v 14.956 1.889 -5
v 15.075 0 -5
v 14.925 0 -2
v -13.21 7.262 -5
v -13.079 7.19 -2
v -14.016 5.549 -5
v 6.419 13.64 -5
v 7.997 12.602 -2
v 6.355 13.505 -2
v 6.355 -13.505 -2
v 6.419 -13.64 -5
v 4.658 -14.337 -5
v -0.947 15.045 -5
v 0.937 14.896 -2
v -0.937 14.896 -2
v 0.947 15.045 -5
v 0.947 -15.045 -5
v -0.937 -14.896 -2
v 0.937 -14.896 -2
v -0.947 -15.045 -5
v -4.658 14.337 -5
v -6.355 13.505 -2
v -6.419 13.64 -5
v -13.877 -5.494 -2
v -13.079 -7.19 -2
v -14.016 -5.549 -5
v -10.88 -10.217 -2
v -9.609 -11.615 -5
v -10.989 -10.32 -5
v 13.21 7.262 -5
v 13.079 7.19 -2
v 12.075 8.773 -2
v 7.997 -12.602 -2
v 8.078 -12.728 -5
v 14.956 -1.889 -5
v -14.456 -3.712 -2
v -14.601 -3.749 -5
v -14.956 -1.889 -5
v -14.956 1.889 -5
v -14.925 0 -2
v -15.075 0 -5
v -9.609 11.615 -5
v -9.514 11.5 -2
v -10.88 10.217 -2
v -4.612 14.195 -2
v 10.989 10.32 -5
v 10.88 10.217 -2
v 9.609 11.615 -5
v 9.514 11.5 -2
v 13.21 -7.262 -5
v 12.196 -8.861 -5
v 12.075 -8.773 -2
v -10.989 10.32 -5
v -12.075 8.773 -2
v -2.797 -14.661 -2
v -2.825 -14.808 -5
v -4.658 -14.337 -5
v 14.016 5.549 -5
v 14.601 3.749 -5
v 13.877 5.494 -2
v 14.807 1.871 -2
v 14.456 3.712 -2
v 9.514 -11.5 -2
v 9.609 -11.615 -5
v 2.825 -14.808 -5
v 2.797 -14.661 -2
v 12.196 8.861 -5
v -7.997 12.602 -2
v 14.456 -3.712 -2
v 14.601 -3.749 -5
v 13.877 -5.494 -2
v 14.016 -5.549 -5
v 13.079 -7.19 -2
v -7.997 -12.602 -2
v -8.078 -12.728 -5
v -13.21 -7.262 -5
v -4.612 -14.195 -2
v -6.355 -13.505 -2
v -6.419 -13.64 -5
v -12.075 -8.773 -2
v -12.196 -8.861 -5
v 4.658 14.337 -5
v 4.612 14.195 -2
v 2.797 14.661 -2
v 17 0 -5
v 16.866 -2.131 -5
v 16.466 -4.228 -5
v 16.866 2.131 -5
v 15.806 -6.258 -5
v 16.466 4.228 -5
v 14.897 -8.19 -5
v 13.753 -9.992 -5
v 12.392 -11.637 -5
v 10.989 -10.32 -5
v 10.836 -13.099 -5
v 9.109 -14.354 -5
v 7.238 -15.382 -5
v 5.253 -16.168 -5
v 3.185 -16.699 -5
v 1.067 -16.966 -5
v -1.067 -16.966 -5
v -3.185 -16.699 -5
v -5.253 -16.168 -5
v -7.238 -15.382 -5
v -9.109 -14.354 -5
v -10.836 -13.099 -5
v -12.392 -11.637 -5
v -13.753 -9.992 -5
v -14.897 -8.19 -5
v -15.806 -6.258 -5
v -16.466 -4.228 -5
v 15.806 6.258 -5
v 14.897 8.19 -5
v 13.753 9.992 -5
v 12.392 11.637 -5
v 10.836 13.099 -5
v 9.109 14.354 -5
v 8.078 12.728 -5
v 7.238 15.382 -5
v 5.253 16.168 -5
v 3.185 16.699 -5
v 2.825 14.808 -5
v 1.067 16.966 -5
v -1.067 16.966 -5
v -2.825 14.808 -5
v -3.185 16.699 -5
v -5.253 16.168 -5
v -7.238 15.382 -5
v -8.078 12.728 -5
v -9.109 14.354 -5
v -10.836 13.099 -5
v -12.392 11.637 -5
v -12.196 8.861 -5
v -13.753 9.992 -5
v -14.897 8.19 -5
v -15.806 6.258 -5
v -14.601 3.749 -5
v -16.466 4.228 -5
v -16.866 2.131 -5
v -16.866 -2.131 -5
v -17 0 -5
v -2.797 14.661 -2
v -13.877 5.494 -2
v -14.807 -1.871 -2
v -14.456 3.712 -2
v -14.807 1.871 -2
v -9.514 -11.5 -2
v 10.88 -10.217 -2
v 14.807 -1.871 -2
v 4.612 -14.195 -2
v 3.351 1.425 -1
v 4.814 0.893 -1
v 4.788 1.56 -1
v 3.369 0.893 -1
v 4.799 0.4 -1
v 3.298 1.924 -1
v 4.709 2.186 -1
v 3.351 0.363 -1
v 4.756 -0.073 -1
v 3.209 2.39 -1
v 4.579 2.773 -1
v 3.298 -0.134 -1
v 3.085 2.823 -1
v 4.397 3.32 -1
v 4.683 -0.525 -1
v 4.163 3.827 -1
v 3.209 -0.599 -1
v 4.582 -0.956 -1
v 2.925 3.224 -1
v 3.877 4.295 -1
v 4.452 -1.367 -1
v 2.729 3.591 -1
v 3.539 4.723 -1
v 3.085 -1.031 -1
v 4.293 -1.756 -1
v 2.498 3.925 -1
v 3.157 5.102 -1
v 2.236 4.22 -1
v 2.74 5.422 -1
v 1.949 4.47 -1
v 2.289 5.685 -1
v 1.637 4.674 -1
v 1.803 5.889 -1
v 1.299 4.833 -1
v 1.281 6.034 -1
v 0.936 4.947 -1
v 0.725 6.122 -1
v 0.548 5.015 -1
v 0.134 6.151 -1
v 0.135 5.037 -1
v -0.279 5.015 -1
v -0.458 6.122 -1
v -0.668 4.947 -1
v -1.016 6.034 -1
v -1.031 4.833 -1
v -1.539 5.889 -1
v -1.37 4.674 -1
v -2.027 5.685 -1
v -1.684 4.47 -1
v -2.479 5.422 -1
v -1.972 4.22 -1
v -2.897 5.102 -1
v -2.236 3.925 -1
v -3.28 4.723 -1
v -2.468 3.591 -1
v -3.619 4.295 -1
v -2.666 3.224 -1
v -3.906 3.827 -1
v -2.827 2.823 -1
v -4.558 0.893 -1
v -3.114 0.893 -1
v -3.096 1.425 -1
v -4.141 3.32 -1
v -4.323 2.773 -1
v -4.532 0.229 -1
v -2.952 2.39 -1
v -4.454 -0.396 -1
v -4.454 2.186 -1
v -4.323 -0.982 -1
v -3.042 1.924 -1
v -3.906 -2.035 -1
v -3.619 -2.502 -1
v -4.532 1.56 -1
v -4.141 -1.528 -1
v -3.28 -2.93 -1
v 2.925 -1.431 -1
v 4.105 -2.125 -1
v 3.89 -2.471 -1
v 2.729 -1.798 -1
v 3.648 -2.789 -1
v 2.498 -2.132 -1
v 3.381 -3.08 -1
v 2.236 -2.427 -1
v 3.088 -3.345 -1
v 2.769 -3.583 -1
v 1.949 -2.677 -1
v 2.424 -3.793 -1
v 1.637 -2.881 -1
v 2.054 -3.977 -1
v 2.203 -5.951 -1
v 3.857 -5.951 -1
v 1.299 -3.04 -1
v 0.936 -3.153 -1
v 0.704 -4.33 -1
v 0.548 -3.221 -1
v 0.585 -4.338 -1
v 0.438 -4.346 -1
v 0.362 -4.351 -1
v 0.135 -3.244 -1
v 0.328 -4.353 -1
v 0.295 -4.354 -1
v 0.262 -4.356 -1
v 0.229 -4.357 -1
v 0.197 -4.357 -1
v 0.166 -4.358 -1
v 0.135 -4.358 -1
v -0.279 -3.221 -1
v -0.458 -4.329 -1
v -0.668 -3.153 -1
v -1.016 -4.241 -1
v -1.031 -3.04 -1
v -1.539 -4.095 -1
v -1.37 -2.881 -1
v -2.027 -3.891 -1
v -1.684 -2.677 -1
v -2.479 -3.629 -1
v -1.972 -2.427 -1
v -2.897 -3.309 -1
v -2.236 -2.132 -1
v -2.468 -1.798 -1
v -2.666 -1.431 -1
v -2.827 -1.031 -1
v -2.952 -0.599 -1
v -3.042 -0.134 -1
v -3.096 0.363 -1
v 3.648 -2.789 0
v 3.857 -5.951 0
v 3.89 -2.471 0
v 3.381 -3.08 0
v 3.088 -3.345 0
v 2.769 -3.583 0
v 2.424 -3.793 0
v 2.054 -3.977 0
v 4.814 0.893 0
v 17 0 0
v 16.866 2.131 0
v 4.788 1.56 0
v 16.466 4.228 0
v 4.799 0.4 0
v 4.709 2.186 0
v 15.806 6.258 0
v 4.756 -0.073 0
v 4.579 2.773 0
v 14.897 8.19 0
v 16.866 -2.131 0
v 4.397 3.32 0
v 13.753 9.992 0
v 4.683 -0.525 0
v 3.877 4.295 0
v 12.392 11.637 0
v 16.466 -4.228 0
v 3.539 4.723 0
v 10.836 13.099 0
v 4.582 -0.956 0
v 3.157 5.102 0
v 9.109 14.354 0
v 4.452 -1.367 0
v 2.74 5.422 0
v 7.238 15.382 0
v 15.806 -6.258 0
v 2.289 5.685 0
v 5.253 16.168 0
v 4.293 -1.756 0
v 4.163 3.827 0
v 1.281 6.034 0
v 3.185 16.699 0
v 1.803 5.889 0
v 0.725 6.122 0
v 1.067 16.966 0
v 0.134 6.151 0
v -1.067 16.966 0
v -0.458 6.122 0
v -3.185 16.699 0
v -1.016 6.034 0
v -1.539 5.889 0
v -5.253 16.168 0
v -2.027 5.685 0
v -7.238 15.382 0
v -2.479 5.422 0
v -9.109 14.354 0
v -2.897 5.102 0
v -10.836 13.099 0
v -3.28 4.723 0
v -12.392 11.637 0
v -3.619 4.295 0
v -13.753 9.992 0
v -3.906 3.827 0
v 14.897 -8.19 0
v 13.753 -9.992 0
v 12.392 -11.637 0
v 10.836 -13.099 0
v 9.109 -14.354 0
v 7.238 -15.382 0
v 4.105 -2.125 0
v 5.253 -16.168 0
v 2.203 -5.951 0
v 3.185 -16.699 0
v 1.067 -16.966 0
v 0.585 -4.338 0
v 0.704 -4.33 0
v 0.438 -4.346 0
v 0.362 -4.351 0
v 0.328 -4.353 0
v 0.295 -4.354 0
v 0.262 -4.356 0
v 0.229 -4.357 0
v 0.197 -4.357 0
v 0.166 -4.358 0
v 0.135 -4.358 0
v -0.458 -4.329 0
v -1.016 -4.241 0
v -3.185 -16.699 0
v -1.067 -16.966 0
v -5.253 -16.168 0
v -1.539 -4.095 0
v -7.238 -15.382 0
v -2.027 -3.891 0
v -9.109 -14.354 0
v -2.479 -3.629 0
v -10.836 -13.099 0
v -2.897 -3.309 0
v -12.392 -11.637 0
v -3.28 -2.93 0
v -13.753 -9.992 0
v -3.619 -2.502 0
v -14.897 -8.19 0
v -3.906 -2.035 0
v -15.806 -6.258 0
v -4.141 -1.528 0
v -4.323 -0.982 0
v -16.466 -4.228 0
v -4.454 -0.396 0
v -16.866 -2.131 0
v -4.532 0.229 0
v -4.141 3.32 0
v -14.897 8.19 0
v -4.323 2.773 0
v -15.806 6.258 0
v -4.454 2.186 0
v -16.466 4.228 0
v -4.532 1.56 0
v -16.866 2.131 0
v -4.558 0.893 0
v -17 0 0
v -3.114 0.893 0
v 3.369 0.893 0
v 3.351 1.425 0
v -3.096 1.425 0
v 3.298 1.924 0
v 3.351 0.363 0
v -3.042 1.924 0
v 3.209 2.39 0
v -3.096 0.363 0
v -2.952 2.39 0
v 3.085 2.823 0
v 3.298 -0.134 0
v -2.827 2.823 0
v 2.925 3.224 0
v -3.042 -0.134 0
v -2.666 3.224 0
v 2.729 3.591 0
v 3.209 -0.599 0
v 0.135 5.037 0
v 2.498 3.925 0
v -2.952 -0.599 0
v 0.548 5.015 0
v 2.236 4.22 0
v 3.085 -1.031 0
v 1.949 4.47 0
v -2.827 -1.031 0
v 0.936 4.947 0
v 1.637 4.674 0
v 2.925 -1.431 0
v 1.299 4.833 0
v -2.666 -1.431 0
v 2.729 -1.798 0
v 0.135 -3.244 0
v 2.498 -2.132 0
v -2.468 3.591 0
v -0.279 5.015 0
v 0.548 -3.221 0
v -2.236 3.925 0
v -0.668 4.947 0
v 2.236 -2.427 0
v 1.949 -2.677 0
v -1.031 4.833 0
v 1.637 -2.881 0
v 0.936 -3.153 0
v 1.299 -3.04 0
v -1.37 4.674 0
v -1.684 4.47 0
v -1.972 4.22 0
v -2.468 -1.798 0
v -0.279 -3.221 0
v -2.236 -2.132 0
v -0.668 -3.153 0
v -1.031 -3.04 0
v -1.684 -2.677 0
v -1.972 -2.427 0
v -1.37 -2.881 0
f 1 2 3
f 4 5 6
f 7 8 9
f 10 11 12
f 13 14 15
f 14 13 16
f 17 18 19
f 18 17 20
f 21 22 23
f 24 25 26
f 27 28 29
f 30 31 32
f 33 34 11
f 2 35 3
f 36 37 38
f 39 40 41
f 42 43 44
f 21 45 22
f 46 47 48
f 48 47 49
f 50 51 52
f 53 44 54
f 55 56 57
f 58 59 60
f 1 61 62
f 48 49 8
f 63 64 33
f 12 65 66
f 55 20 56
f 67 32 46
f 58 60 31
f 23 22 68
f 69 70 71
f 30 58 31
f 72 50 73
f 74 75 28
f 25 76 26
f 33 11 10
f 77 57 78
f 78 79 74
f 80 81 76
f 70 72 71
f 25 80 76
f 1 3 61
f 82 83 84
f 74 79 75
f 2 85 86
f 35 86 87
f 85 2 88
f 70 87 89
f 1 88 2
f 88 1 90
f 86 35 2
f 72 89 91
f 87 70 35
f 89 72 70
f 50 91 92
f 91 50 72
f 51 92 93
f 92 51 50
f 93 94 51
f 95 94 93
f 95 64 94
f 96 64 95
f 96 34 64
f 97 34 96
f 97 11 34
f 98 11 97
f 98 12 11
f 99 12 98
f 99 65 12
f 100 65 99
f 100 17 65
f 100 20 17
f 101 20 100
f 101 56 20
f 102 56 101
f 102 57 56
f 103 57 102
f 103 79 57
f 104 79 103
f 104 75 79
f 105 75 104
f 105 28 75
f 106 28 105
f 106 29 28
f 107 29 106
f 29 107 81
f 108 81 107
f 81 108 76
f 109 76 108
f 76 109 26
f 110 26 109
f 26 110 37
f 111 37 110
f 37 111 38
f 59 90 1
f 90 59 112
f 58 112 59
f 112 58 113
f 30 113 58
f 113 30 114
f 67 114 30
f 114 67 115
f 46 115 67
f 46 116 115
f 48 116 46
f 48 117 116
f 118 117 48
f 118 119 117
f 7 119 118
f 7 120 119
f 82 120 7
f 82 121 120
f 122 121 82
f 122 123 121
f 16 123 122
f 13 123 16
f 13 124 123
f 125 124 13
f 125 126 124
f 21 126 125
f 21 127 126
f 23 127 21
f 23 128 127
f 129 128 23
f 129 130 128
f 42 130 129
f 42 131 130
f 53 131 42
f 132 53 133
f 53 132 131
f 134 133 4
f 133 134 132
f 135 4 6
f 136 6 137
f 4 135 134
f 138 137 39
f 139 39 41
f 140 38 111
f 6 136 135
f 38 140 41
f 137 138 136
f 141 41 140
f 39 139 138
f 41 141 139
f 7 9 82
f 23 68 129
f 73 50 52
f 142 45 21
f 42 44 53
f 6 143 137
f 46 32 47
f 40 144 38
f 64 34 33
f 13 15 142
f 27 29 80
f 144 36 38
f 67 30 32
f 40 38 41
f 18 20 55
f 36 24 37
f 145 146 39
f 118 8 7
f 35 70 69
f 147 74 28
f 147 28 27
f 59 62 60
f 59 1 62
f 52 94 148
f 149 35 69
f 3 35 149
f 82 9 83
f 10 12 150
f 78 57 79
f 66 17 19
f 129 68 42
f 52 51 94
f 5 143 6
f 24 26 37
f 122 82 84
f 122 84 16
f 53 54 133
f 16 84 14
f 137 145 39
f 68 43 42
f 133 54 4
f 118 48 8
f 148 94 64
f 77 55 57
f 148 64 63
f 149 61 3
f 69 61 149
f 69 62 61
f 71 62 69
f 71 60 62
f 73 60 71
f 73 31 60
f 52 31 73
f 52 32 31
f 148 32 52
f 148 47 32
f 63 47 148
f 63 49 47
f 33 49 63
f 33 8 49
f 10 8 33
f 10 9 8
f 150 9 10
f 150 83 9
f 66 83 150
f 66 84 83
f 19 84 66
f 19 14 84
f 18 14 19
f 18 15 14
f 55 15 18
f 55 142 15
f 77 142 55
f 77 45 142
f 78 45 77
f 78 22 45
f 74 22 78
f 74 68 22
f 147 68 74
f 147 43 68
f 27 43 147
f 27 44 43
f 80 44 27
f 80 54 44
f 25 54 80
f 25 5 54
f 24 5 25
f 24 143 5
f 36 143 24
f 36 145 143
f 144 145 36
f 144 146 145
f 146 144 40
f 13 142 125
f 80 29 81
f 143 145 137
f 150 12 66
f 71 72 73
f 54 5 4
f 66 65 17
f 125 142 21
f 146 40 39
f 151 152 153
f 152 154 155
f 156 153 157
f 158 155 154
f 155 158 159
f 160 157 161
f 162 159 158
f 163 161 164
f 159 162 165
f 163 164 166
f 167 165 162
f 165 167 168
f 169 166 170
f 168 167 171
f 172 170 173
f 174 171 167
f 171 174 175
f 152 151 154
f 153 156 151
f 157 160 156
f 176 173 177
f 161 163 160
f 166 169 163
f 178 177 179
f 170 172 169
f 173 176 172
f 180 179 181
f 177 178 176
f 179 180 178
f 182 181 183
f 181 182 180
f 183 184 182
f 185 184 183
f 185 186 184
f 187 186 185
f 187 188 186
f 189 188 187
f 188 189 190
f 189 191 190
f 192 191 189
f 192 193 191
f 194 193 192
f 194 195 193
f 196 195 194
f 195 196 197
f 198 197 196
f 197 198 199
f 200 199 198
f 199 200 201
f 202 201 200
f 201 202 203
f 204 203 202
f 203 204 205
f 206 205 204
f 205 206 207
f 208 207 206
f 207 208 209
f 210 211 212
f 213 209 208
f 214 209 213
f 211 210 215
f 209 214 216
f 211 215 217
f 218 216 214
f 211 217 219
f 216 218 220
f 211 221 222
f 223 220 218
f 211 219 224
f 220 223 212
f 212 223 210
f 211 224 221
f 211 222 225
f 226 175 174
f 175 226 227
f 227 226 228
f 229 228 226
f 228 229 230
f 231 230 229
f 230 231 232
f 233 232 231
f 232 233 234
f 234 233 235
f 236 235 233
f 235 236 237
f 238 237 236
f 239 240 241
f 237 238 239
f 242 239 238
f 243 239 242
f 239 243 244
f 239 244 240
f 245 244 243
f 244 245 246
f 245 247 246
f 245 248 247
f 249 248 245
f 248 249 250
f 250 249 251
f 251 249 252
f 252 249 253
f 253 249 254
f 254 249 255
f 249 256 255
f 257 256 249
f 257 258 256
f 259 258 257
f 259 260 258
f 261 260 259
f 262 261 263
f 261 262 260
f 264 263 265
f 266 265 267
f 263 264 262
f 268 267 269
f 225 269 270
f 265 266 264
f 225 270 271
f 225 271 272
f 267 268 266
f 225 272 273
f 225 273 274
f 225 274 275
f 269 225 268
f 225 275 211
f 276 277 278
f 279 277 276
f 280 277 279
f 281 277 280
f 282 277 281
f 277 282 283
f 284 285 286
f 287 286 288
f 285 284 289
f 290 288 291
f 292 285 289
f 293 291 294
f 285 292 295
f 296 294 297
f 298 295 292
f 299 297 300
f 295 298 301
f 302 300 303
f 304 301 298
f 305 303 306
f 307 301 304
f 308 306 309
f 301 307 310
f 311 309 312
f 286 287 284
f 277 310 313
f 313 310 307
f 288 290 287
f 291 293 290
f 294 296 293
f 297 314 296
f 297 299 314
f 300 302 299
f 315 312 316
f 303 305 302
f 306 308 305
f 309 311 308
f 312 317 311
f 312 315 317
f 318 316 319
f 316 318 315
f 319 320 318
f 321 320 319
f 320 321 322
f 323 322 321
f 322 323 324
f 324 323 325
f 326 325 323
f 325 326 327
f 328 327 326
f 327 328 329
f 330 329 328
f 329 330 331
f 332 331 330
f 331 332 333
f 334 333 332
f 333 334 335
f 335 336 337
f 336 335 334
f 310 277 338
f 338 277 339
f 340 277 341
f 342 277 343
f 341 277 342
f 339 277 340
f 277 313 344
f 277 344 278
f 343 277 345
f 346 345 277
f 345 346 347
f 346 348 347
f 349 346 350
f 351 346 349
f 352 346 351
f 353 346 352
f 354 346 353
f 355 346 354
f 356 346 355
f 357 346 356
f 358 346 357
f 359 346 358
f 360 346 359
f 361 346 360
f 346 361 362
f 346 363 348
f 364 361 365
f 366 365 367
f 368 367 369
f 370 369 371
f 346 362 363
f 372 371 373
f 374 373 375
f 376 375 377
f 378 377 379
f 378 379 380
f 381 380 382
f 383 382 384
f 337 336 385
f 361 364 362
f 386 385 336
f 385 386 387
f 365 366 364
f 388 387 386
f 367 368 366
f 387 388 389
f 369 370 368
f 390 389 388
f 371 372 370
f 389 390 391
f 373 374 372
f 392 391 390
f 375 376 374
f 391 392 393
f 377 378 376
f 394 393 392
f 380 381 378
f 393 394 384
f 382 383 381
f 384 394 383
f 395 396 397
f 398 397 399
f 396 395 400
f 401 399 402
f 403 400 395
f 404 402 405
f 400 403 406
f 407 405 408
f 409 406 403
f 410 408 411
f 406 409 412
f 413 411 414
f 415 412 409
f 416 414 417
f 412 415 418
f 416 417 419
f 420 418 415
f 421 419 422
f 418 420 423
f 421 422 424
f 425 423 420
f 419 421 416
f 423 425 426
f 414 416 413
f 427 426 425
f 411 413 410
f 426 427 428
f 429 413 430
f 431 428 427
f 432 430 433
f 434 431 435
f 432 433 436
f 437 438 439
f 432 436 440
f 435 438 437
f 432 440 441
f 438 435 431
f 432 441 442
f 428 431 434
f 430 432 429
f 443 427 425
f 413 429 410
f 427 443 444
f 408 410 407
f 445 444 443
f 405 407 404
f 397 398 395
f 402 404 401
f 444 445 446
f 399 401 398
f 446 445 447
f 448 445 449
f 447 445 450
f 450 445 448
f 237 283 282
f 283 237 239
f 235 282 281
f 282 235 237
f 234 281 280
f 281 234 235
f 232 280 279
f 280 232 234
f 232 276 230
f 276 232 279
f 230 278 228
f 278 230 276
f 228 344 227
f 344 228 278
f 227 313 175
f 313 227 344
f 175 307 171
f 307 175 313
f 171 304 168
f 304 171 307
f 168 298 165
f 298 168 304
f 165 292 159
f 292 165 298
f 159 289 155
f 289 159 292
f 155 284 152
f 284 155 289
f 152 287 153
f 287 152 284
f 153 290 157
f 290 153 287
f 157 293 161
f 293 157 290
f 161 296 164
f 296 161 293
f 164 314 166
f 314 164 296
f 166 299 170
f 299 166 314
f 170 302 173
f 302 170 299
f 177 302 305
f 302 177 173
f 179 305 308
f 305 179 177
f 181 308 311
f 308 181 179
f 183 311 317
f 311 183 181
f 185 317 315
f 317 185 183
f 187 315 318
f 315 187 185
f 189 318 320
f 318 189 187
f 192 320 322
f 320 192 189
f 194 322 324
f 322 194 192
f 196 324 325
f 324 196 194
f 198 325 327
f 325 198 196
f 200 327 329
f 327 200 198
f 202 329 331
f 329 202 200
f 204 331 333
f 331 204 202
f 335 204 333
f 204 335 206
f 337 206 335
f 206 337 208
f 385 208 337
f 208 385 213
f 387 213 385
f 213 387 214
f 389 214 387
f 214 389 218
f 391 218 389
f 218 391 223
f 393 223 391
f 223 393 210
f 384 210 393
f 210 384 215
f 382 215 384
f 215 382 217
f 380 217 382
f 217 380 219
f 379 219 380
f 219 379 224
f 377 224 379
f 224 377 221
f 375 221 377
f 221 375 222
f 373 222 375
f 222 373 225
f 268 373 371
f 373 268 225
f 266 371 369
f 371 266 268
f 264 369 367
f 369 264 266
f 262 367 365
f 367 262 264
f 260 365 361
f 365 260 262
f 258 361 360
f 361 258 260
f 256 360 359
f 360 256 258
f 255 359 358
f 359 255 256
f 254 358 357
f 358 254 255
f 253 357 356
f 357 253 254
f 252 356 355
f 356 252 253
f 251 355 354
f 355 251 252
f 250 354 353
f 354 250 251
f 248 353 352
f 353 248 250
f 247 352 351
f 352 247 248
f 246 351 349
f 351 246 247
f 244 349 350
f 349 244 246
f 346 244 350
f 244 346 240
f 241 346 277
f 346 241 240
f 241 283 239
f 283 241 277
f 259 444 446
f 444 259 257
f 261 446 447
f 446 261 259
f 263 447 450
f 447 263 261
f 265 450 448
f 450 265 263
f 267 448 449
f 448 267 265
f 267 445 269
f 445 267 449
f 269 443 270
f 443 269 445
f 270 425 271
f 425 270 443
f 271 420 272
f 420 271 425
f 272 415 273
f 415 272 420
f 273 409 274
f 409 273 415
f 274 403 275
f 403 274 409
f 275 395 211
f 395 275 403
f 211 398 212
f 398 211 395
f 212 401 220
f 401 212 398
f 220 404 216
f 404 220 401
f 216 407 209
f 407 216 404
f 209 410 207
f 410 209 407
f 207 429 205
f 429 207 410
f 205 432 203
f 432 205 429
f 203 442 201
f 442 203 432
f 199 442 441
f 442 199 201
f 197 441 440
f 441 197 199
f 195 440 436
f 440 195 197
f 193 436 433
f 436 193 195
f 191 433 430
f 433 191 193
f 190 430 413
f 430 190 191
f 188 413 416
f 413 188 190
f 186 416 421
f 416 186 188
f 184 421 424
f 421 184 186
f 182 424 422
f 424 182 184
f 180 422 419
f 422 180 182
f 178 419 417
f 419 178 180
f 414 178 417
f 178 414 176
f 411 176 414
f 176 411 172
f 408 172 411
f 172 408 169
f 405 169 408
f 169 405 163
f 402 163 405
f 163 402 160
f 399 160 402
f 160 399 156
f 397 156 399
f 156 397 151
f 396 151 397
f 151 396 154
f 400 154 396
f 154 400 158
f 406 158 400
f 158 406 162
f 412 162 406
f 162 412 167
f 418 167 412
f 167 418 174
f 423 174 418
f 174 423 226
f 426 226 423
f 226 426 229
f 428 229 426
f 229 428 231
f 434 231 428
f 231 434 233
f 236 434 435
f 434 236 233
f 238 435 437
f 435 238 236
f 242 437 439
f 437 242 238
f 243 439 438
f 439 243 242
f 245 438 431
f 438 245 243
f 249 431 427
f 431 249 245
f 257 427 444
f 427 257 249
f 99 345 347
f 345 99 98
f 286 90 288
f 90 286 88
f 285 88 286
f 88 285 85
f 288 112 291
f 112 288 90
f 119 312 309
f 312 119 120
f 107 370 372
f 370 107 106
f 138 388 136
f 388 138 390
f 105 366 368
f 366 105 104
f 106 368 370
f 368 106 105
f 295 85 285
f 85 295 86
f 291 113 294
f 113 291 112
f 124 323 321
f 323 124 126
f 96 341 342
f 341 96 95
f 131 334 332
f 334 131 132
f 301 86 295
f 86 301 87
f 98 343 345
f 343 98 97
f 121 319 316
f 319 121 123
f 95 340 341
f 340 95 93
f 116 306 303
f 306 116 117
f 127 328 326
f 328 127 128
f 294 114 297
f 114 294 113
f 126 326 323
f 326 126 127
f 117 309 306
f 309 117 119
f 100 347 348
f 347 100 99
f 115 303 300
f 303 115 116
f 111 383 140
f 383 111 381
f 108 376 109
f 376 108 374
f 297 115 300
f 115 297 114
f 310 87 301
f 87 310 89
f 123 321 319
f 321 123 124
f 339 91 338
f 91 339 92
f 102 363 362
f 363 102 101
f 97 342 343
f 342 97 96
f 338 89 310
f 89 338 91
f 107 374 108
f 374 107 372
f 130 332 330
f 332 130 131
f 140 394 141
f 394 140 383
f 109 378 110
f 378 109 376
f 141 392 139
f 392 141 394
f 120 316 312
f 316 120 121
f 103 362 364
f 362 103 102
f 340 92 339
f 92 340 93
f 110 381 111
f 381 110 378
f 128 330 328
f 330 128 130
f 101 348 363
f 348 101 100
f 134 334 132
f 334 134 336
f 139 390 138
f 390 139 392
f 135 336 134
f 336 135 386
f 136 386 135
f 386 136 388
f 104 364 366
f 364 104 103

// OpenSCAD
$fn = 50;

difference() {
	union() {
		translate(v = [0, 0, -5.0]) {
			cylinder(h = 5, r = 17.0);
		}
	}
	union() {
		#translate(v = [0, 0, -5.0]) {
			cylinder(h = 3, r1 = 15.075, r2 = 14.925);
		}
		translate(v = [0, 0, -1]) {
			linear_extrude(height = 1) {
				text(font = "Impact", halign = "center", size = 10, text = "Q", valign = "center");
			}
		}
	}
}
